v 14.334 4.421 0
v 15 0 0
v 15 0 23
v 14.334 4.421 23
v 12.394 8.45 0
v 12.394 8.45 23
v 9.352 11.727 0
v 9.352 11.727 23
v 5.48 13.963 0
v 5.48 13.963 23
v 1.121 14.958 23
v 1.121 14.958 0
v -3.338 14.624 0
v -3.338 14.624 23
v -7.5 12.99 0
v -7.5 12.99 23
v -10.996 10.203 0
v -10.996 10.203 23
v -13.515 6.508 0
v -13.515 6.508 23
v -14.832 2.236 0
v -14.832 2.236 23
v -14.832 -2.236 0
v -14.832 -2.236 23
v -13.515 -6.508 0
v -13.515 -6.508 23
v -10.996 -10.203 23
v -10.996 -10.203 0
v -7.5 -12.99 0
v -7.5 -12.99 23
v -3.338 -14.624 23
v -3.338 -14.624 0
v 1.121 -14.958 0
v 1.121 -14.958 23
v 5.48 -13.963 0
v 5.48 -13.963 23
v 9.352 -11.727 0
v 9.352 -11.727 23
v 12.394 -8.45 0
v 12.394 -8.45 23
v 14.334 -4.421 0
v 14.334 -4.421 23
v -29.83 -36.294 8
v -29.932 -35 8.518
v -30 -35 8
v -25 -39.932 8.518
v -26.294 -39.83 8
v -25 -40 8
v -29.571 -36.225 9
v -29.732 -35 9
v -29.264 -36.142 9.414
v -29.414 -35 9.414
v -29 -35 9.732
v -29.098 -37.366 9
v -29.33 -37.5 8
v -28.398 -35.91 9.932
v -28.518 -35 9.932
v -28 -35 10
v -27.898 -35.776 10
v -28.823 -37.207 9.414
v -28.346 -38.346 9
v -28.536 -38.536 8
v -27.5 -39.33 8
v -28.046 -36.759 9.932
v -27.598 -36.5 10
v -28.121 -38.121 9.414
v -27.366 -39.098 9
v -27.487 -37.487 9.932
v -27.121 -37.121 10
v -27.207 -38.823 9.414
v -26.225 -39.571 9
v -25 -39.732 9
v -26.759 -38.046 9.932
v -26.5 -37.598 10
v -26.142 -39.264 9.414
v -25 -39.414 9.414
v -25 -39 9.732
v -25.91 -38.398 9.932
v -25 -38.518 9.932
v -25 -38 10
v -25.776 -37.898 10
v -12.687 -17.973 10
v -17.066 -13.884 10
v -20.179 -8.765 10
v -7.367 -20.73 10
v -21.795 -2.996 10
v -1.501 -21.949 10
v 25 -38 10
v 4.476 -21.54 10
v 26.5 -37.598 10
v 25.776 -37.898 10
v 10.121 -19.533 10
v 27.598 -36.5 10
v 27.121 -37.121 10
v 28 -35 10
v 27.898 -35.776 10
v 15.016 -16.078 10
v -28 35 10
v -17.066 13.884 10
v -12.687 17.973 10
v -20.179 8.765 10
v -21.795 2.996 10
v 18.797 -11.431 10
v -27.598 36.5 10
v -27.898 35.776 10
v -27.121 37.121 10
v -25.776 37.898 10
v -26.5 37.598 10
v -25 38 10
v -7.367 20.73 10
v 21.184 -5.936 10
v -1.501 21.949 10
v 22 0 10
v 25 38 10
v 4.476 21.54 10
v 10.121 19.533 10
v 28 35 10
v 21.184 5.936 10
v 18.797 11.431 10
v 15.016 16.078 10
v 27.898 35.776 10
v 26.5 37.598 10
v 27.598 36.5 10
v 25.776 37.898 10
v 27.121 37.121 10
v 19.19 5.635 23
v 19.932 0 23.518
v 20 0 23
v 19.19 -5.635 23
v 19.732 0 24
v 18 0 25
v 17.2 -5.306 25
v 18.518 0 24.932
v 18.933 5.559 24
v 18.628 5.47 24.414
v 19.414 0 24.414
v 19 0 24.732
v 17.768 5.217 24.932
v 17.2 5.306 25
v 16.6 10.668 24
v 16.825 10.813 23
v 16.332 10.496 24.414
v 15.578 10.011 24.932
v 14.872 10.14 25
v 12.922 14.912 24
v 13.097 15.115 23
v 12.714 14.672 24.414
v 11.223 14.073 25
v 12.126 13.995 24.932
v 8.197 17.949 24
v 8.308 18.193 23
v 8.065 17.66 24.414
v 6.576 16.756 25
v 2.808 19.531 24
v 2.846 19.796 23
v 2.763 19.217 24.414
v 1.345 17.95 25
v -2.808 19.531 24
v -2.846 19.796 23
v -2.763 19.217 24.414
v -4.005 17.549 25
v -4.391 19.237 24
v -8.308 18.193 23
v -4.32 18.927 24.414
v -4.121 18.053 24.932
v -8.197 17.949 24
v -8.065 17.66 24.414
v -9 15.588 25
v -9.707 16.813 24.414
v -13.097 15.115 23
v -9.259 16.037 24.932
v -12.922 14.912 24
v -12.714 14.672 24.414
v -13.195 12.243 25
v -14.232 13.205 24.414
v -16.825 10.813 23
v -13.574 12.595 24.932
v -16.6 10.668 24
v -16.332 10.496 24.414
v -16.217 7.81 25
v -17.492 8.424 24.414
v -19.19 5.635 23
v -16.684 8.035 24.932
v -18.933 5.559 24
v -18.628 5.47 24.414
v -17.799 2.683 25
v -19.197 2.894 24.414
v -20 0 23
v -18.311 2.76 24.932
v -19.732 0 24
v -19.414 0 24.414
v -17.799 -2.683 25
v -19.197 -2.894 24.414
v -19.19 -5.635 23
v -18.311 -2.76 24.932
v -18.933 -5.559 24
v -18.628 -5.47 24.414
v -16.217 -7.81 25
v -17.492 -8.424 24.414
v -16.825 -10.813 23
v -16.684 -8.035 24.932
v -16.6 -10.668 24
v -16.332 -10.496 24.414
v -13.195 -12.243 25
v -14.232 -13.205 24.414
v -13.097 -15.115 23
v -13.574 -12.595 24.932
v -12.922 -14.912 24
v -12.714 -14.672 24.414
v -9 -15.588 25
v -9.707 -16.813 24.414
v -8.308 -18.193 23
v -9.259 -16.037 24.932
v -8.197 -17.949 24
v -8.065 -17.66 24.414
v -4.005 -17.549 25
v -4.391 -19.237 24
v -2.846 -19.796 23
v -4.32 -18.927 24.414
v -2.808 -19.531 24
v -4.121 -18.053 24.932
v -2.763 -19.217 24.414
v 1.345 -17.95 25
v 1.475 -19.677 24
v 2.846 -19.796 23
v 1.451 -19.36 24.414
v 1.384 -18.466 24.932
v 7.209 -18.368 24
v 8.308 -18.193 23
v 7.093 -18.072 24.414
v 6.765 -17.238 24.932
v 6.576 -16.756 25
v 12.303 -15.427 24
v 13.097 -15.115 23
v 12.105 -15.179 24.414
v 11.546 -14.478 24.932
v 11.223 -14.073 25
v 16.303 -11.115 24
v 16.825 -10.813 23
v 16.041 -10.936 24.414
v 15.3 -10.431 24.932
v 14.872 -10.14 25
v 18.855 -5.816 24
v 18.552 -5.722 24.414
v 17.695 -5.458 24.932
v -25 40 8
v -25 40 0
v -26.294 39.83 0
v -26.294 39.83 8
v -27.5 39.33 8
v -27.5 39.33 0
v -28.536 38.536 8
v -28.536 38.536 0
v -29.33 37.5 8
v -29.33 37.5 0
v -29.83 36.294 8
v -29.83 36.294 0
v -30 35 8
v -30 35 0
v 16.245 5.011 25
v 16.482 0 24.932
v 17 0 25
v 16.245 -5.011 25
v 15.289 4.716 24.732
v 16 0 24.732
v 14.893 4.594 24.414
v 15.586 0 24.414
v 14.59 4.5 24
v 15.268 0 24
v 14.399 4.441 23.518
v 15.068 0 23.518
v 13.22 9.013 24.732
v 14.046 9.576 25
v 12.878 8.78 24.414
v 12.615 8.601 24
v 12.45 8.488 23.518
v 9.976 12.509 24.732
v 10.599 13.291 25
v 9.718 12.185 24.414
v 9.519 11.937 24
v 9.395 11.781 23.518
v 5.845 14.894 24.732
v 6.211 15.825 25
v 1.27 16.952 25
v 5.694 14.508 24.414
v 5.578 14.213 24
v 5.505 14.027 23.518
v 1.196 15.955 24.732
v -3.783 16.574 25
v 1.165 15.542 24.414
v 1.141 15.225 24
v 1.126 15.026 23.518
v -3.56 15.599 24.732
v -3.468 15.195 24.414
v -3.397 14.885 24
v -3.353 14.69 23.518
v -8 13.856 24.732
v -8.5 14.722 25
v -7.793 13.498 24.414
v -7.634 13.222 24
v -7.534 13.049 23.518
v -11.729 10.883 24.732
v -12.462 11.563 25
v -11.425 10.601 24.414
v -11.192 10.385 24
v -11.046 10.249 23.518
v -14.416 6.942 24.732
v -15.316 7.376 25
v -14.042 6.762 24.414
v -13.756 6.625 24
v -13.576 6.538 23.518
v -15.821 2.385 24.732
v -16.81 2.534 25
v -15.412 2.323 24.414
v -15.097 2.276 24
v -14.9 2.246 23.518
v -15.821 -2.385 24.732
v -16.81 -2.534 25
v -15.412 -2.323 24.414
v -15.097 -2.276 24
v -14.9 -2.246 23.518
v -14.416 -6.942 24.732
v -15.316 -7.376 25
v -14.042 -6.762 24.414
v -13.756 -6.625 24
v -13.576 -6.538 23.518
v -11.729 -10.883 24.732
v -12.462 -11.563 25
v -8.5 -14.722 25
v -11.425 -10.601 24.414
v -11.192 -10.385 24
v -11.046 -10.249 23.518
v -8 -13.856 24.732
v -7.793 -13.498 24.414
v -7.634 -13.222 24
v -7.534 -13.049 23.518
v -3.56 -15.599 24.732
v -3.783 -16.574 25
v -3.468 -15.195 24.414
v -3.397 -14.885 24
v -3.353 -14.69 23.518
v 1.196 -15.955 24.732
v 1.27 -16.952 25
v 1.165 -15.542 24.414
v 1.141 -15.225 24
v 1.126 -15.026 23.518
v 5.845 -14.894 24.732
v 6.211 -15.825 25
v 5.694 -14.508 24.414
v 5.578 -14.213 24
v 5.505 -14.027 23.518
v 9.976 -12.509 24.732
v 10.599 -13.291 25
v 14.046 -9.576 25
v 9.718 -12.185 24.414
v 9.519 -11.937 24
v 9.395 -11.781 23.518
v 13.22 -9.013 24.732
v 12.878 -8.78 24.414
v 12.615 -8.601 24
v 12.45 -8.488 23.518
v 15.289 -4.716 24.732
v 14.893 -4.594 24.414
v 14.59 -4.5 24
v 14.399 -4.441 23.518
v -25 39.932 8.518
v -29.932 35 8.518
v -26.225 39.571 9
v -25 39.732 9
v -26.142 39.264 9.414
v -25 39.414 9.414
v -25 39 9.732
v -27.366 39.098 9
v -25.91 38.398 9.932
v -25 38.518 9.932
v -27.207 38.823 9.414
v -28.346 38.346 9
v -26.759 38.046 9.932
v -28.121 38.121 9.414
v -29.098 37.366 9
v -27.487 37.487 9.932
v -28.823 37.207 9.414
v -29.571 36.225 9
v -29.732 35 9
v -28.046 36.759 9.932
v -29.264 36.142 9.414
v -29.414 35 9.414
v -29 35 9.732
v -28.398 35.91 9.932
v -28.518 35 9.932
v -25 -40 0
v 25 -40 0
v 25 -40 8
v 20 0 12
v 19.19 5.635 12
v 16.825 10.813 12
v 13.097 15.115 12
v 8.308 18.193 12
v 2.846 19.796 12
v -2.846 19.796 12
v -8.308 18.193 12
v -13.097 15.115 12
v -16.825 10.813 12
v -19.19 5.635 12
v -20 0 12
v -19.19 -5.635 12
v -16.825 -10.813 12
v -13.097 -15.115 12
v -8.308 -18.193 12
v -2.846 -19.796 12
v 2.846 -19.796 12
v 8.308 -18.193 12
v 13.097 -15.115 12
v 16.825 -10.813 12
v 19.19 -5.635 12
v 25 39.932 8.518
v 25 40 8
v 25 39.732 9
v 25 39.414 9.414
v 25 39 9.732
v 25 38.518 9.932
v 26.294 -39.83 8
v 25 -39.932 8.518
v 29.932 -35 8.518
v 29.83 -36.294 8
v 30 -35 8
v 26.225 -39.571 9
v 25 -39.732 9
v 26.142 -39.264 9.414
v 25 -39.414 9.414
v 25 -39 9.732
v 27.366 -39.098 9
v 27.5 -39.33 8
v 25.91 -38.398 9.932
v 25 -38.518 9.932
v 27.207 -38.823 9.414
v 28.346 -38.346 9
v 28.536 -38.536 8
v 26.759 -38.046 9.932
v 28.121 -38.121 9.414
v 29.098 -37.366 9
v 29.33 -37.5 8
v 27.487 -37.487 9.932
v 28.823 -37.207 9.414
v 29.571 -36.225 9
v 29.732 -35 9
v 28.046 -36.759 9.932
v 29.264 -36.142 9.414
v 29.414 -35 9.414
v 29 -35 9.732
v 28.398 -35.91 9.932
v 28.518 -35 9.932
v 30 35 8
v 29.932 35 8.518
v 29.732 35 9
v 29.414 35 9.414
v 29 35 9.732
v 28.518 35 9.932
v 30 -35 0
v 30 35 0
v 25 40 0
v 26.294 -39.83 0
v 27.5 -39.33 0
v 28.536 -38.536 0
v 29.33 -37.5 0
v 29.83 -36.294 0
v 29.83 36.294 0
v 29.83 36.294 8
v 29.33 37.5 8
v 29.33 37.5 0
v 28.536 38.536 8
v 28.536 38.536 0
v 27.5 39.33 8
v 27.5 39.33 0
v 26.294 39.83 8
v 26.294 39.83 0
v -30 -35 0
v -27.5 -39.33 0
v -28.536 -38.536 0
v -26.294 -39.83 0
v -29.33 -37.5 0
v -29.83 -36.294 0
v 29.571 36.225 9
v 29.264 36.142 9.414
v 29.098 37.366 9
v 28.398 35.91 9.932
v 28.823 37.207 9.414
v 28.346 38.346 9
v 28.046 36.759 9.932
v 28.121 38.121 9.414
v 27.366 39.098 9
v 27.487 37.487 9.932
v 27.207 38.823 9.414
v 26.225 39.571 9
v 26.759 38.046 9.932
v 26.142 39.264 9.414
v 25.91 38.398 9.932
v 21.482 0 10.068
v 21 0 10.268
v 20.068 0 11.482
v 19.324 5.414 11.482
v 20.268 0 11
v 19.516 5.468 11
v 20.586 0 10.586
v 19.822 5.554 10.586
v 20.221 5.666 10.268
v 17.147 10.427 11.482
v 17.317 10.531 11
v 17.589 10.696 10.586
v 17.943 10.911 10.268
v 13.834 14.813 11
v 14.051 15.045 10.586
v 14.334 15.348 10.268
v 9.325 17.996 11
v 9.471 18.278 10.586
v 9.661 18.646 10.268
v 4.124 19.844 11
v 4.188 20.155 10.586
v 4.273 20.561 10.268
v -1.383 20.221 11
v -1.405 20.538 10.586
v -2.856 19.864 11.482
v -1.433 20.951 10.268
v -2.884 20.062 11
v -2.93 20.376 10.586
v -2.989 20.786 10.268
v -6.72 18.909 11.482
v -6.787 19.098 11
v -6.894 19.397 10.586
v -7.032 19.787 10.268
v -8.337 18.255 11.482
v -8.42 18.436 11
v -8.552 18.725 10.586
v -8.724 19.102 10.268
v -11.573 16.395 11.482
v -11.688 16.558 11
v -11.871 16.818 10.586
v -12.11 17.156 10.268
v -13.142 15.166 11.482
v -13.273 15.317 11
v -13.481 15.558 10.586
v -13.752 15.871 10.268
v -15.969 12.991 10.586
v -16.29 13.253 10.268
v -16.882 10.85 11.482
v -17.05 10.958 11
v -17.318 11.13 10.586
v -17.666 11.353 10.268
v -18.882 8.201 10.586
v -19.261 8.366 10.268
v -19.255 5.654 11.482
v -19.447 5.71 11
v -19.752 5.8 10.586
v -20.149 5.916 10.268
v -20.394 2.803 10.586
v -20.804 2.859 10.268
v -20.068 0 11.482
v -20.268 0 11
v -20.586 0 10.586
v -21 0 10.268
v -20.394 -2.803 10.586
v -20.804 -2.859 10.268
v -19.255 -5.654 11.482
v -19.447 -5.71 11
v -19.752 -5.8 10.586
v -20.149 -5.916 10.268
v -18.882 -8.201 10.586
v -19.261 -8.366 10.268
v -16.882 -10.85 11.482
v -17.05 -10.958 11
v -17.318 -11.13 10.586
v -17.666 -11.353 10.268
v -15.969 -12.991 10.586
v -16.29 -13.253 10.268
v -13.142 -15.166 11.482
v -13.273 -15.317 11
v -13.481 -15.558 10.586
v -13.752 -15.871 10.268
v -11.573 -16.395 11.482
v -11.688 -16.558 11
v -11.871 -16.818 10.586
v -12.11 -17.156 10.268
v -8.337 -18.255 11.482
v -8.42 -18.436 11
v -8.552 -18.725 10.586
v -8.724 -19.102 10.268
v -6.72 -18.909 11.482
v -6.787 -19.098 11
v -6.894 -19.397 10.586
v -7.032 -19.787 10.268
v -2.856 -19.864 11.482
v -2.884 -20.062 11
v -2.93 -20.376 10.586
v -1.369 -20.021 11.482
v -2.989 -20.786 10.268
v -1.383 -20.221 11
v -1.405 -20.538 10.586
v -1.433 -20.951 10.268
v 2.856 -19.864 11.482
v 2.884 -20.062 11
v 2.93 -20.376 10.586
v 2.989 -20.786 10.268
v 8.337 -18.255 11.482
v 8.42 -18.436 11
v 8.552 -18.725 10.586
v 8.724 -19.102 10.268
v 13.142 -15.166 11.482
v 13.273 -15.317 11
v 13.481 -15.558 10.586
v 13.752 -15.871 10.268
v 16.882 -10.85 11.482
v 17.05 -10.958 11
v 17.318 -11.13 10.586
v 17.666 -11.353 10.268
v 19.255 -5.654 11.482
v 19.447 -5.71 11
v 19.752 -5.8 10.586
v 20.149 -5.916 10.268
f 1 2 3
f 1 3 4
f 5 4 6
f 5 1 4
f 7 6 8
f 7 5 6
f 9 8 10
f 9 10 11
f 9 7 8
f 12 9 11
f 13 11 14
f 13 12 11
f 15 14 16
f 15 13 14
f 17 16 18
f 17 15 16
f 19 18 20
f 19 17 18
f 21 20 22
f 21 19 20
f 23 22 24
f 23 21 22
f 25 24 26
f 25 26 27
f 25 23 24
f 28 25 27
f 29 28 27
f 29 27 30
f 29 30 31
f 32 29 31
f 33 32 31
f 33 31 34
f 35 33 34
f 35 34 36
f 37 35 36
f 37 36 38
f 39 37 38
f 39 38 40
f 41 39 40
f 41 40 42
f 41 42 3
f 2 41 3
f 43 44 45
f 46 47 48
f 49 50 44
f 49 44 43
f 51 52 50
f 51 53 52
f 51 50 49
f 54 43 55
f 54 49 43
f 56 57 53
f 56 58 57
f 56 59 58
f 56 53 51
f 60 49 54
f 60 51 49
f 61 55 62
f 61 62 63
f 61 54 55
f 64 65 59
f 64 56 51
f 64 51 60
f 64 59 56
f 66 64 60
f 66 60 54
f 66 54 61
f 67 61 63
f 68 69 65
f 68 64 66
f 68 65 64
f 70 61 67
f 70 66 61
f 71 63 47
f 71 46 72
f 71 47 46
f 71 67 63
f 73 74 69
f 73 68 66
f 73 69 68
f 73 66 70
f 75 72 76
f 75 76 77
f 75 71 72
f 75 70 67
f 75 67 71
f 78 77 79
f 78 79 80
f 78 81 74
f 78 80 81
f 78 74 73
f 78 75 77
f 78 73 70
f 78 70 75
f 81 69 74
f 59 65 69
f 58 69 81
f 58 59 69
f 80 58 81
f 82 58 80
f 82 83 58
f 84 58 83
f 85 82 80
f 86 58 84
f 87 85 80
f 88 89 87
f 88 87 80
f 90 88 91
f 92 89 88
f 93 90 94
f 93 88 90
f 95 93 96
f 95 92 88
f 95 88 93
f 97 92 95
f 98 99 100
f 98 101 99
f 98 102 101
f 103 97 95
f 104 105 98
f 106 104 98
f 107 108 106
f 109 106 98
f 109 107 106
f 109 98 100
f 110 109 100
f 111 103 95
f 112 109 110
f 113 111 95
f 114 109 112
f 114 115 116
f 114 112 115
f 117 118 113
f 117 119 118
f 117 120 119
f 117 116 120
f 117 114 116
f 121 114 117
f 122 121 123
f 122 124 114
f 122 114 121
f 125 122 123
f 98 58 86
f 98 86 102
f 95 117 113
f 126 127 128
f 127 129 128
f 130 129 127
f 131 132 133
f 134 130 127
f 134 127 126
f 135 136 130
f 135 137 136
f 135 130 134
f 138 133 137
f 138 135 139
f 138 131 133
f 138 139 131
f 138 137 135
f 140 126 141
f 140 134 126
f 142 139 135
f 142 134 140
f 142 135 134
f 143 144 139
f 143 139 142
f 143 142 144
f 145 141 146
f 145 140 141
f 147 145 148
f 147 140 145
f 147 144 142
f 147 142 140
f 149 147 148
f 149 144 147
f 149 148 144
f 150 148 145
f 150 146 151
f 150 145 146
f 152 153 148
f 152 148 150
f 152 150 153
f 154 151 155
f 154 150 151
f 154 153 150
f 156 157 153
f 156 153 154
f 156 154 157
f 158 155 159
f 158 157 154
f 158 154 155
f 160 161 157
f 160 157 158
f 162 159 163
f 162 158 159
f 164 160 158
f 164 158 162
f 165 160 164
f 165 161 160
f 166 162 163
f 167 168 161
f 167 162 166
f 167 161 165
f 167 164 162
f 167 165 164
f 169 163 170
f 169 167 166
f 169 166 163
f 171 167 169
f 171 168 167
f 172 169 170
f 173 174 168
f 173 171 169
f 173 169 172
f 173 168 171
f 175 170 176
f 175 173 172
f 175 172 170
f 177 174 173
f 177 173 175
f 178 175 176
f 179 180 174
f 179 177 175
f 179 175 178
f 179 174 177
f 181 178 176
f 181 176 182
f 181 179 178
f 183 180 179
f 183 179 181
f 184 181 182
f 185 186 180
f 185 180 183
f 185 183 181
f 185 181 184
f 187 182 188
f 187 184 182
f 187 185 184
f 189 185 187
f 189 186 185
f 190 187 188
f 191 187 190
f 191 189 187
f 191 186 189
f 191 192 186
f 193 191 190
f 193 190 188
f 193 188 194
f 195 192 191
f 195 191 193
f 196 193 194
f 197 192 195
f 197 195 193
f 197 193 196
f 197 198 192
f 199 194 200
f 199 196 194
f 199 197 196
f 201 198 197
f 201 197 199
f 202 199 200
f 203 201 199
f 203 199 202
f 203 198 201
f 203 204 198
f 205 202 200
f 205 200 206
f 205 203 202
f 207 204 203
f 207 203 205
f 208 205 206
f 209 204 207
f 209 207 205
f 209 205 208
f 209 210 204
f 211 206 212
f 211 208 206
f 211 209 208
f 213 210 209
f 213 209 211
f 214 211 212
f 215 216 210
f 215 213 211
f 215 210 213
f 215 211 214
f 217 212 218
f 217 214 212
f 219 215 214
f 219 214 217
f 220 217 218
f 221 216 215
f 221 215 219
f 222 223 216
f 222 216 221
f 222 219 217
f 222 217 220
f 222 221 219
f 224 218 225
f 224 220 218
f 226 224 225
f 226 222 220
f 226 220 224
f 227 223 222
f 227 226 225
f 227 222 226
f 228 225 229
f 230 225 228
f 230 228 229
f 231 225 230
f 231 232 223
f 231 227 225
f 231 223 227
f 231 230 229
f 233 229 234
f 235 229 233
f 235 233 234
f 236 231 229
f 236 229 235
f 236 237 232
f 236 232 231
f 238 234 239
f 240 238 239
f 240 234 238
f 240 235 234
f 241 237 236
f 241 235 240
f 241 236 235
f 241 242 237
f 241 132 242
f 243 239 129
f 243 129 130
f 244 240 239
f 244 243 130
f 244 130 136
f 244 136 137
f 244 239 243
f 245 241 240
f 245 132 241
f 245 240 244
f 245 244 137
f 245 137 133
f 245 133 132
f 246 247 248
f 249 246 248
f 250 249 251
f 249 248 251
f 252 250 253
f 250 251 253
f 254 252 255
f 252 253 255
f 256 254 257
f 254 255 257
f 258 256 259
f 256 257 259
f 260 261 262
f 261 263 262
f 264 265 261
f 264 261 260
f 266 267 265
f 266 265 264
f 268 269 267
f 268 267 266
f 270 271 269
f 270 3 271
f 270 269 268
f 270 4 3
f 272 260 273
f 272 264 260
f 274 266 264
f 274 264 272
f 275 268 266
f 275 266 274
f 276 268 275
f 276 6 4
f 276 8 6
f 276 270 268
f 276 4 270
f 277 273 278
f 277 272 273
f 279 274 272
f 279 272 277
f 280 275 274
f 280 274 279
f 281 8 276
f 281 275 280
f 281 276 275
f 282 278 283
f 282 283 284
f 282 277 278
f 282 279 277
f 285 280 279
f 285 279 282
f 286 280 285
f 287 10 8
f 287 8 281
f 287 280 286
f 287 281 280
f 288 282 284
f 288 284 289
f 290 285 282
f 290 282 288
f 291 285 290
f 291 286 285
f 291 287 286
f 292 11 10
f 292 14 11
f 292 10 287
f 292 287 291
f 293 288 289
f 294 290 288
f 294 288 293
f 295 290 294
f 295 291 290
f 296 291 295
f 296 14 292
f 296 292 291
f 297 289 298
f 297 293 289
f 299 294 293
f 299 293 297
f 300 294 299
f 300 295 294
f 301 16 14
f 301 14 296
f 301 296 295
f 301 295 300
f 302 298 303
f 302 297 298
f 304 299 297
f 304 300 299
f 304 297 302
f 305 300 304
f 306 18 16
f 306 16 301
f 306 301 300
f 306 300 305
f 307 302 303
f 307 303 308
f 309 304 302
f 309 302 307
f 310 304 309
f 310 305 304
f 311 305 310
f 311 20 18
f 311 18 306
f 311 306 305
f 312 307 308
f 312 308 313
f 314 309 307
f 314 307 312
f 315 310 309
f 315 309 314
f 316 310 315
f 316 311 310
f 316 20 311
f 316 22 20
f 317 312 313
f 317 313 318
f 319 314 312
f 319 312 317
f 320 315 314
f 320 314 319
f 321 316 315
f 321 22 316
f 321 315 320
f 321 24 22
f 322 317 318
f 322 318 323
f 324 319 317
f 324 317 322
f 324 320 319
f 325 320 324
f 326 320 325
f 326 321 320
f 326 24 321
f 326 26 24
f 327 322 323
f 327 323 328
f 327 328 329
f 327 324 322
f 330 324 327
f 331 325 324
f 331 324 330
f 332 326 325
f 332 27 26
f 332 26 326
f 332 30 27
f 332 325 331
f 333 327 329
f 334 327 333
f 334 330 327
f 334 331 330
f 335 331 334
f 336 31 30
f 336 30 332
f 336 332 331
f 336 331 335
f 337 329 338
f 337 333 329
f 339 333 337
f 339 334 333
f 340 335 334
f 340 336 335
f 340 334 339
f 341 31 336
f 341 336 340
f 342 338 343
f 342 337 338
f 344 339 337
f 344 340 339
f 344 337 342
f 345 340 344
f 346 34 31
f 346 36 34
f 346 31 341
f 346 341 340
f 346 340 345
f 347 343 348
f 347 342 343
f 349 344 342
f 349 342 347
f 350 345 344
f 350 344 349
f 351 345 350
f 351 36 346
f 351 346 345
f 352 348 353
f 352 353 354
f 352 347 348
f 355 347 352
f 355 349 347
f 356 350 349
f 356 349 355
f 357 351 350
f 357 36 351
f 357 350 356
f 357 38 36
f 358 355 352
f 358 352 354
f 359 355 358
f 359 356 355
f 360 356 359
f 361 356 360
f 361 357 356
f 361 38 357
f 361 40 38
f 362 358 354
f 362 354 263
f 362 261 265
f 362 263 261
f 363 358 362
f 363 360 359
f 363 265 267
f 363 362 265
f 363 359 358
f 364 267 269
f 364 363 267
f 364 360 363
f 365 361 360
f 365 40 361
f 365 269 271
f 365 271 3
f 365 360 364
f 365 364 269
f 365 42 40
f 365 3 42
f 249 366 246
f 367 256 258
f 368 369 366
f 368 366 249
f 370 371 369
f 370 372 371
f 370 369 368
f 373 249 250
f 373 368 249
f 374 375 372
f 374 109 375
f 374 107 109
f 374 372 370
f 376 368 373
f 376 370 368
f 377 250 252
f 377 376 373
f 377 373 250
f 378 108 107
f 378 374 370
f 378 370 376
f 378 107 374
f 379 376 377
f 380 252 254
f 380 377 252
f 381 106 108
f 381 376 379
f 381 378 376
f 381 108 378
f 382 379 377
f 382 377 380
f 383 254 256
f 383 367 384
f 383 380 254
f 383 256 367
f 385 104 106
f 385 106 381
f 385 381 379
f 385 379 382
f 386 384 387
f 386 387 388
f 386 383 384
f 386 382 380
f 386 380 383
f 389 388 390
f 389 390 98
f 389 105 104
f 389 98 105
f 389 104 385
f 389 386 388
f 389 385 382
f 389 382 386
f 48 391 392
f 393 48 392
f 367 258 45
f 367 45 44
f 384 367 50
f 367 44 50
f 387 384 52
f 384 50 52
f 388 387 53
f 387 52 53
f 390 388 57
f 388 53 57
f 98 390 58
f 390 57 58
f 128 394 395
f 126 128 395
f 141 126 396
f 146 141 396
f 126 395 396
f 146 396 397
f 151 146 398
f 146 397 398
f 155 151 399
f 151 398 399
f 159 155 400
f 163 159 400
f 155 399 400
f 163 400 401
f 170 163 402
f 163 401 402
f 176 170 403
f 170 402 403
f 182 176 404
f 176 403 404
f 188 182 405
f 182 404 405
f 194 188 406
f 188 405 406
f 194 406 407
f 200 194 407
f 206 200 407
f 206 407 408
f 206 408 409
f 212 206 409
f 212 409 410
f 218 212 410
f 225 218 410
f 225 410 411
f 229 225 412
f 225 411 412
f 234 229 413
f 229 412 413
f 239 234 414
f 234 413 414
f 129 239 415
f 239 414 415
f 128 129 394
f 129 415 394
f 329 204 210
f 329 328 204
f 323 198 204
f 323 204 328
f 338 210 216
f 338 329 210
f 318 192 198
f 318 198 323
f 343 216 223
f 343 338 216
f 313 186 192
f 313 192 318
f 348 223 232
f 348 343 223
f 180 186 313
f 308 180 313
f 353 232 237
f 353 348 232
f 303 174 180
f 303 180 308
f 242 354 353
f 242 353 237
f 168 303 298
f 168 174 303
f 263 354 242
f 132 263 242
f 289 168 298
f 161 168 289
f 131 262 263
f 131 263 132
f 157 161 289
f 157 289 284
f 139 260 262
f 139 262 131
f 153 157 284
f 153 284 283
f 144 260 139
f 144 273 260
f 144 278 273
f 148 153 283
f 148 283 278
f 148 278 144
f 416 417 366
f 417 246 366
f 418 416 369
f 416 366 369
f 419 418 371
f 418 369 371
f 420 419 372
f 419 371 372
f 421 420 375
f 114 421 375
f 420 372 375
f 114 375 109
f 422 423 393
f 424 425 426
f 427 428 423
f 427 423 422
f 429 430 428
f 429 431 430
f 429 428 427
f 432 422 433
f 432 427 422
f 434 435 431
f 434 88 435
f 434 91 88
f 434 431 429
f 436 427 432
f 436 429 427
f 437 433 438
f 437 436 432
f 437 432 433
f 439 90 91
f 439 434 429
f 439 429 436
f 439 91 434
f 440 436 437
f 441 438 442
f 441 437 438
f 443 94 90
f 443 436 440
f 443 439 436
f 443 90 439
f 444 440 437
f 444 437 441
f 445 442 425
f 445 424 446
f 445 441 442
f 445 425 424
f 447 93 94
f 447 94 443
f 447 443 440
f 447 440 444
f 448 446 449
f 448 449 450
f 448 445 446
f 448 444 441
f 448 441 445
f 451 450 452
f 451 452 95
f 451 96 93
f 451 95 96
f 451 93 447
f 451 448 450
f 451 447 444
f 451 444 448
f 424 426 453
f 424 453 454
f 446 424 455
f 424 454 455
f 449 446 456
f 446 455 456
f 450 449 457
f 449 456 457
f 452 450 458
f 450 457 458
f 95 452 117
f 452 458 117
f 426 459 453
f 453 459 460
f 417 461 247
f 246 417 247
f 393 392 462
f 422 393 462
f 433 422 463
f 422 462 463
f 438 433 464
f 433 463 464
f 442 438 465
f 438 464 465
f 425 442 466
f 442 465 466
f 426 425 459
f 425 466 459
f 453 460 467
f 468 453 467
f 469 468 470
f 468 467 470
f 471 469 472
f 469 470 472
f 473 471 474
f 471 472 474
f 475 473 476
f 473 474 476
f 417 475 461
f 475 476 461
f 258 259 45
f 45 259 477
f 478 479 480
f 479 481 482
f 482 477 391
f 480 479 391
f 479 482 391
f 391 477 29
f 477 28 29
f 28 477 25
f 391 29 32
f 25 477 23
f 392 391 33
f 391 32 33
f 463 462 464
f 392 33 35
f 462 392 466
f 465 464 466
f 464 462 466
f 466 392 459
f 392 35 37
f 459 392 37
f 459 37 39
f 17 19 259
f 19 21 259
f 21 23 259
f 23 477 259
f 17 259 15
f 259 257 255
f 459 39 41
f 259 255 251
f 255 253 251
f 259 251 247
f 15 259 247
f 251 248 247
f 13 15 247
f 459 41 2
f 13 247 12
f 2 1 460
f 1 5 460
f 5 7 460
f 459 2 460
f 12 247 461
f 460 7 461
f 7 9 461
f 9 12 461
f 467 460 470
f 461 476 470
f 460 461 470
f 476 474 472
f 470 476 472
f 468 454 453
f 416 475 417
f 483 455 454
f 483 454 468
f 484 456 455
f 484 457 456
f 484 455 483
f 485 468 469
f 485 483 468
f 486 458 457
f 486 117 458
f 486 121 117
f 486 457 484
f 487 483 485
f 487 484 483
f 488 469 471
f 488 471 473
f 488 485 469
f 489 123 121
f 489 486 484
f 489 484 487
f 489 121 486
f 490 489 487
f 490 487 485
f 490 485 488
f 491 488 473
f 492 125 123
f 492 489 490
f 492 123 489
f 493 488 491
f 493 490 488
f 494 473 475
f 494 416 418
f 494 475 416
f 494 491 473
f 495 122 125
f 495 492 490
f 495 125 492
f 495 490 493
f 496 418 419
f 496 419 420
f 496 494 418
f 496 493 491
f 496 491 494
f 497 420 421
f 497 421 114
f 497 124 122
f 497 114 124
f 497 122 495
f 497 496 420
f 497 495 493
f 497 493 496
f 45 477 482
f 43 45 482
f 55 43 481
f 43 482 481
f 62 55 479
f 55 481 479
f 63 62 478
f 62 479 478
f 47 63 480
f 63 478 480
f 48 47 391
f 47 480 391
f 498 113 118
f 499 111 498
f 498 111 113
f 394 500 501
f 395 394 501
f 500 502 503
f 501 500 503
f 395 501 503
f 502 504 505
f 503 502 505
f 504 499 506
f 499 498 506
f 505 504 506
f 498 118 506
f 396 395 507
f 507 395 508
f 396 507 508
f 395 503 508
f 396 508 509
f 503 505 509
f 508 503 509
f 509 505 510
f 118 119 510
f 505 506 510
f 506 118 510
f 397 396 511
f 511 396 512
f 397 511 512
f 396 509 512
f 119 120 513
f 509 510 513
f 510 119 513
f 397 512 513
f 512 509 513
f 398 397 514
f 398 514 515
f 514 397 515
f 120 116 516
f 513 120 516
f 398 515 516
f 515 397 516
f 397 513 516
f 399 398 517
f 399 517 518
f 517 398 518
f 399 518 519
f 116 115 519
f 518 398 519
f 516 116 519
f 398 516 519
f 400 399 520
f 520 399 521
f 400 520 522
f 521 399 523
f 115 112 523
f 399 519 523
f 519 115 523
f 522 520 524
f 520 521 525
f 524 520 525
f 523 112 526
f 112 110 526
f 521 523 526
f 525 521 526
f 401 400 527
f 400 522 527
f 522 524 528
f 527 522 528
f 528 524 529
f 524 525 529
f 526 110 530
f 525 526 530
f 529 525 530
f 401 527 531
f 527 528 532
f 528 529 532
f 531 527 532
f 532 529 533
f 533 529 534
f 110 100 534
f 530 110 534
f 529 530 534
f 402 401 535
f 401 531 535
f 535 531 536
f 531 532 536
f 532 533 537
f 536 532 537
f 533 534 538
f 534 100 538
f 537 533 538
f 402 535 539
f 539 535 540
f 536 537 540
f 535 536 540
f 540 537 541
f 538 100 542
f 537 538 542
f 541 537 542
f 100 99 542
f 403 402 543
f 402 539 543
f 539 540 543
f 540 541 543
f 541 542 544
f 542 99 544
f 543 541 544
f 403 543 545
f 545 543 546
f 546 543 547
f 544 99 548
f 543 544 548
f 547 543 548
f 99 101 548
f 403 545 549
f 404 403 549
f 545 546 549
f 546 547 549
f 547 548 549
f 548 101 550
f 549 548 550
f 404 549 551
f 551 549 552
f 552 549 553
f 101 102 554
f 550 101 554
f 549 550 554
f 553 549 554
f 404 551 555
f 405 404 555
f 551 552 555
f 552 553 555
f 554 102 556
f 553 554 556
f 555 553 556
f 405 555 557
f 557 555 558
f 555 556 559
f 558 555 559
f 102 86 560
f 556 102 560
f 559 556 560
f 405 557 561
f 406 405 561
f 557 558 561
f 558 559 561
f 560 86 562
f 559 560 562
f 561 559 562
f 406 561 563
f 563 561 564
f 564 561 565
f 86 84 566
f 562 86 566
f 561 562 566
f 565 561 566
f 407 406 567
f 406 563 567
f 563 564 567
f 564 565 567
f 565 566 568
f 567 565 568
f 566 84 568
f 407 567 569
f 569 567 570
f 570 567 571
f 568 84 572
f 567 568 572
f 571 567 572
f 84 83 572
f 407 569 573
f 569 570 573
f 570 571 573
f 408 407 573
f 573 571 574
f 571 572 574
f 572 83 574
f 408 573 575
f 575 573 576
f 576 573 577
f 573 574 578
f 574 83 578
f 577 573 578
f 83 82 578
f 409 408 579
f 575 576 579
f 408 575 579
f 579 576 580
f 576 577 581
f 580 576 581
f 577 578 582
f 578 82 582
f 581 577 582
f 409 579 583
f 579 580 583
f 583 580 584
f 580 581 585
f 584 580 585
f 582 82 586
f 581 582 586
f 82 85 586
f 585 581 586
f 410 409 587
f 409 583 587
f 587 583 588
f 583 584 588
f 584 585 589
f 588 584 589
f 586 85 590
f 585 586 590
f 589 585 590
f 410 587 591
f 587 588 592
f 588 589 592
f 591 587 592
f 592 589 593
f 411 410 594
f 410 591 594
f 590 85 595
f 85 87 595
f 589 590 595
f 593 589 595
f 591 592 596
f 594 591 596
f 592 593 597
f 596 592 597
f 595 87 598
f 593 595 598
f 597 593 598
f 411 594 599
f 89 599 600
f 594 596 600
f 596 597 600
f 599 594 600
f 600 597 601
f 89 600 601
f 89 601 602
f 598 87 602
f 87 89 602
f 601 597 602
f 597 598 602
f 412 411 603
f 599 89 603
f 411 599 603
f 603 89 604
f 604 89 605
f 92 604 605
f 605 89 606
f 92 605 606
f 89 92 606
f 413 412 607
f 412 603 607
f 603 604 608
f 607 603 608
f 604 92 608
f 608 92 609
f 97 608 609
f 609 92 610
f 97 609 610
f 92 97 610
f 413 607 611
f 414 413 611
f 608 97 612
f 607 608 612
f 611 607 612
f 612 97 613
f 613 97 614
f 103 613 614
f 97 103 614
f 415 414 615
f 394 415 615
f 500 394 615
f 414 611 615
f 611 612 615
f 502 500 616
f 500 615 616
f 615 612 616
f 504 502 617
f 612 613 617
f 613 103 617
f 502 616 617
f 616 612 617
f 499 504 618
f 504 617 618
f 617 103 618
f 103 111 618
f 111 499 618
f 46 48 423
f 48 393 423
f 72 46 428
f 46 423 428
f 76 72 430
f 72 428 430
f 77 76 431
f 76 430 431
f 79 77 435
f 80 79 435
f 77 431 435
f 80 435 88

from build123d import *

# Parameters (mm, degrees)
F0_R     = 15
F1_DEPTH = 10
F2_R     = 20
F2_R_2   = 15
F3_DEPTH = 15
F4_R     = 2


with BuildPart() as f1:
    # F0 (on Top) → F1 (new body)
    with BuildSketch(Plane.XY):
        with BuildLine():
            Line((-25, -40), (25, -40))
            ThreePointArc((25, -40), (28.535534, -38.535534), (30, -35))
            Line((30, -35), (30, 35))
            ThreePointArc((30, 35), (28.535534, 38.535534), (25, 40))
            Line((25, 40), (-25, 40))
            ThreePointArc((-25, 40), (-28.535534, 38.535534), (-30, 35))
            Line((-30, 35), (-30, -35))
            ThreePointArc((-30, -35), (-28.535534, -38.535534), (-25, -40))
        make_face()
        Circle(F0_R, mode=Mode.SUBTRACT)
    extrude(amount=F1_DEPTH)

    # F2 (on face) → F3 (join)
    with BuildSketch(Plane.XY.offset(10)):
        Circle(F2_R)
        Circle(F2_R_2, mode=Mode.SUBTRACT)
    extrude(amount=F3_DEPTH)

    # F4
    f4_edges = [f1.edges().sort_by_distance(p)[0] for p in [
        (-20, 0, 25),
        (-15, 0, 25),
        (-28.535534, -38.535534, 10),
        (-30, 0, 10),
        (0, -40, 10),
        (-28.535534, 38.535534, 10),
        (28.535534, -38.535534, 10),
        (0, 40, 10),
        (30, 0, 10),
        (28.535534, 38.535534, 10),
        (-20, 0, 10),
    ]]
    fillet(f4_edges, radius=F4_R)


solid = f1.part
